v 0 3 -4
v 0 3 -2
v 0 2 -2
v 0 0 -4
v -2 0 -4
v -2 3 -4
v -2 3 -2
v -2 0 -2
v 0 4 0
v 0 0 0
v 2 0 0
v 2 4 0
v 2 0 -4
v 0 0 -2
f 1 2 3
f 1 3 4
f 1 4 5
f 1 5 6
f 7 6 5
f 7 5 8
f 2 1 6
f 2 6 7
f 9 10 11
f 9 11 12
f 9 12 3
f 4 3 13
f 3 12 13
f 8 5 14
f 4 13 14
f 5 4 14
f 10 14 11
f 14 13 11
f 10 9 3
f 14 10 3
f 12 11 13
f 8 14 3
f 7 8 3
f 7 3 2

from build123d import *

# Parameters (mm, degrees)
SKETCH1_W           = 4
SKETCH1_H           = 4
BOSS_EXTRUDE1_DEPTH = 2
SKETCH2_W           = 2
SKETCH2_H           = 3
BOSS_EXTRUDE2_DEPTH = 2
CUT_EXTRUDE2_DEPTH  = 2


with BuildPart() as part:
    # Sketch1 → Boss-Extrude1 (new body)
    with BuildSketch(Plane(origin=(0, 0, 0), x_dir=(0, 0, -1), z_dir=(1, 0, 0))):
        with Locations((2, 2)):
            Rectangle(SKETCH1_W, SKETCH1_H)
    extrude(amount=BOSS_EXTRUDE1_DEPTH)

    # Sketch2 → Boss-Extrude2 (add)
    with BuildSketch(Plane.ZY):
        with Locations((-3, 1.5)):
            Rectangle(SKETCH2_W, SKETCH2_H)
    extrude(amount=BOSS_EXTRUDE2_DEPTH)

    # Sketch3 → Cut-Extrude2 (cut)
    with BuildSketch(Plane(origin=(2, 0, 0), x_dir=(0, 0, -1), z_dir=(1, 0, 0))):
        Polygon((0, 4), (4, 0), (4, 4), align=None)
    extrude(amount=-CUT_EXTRUDE2_DEPTH, mode=Mode.SUBTRACT)


solid = part.part
